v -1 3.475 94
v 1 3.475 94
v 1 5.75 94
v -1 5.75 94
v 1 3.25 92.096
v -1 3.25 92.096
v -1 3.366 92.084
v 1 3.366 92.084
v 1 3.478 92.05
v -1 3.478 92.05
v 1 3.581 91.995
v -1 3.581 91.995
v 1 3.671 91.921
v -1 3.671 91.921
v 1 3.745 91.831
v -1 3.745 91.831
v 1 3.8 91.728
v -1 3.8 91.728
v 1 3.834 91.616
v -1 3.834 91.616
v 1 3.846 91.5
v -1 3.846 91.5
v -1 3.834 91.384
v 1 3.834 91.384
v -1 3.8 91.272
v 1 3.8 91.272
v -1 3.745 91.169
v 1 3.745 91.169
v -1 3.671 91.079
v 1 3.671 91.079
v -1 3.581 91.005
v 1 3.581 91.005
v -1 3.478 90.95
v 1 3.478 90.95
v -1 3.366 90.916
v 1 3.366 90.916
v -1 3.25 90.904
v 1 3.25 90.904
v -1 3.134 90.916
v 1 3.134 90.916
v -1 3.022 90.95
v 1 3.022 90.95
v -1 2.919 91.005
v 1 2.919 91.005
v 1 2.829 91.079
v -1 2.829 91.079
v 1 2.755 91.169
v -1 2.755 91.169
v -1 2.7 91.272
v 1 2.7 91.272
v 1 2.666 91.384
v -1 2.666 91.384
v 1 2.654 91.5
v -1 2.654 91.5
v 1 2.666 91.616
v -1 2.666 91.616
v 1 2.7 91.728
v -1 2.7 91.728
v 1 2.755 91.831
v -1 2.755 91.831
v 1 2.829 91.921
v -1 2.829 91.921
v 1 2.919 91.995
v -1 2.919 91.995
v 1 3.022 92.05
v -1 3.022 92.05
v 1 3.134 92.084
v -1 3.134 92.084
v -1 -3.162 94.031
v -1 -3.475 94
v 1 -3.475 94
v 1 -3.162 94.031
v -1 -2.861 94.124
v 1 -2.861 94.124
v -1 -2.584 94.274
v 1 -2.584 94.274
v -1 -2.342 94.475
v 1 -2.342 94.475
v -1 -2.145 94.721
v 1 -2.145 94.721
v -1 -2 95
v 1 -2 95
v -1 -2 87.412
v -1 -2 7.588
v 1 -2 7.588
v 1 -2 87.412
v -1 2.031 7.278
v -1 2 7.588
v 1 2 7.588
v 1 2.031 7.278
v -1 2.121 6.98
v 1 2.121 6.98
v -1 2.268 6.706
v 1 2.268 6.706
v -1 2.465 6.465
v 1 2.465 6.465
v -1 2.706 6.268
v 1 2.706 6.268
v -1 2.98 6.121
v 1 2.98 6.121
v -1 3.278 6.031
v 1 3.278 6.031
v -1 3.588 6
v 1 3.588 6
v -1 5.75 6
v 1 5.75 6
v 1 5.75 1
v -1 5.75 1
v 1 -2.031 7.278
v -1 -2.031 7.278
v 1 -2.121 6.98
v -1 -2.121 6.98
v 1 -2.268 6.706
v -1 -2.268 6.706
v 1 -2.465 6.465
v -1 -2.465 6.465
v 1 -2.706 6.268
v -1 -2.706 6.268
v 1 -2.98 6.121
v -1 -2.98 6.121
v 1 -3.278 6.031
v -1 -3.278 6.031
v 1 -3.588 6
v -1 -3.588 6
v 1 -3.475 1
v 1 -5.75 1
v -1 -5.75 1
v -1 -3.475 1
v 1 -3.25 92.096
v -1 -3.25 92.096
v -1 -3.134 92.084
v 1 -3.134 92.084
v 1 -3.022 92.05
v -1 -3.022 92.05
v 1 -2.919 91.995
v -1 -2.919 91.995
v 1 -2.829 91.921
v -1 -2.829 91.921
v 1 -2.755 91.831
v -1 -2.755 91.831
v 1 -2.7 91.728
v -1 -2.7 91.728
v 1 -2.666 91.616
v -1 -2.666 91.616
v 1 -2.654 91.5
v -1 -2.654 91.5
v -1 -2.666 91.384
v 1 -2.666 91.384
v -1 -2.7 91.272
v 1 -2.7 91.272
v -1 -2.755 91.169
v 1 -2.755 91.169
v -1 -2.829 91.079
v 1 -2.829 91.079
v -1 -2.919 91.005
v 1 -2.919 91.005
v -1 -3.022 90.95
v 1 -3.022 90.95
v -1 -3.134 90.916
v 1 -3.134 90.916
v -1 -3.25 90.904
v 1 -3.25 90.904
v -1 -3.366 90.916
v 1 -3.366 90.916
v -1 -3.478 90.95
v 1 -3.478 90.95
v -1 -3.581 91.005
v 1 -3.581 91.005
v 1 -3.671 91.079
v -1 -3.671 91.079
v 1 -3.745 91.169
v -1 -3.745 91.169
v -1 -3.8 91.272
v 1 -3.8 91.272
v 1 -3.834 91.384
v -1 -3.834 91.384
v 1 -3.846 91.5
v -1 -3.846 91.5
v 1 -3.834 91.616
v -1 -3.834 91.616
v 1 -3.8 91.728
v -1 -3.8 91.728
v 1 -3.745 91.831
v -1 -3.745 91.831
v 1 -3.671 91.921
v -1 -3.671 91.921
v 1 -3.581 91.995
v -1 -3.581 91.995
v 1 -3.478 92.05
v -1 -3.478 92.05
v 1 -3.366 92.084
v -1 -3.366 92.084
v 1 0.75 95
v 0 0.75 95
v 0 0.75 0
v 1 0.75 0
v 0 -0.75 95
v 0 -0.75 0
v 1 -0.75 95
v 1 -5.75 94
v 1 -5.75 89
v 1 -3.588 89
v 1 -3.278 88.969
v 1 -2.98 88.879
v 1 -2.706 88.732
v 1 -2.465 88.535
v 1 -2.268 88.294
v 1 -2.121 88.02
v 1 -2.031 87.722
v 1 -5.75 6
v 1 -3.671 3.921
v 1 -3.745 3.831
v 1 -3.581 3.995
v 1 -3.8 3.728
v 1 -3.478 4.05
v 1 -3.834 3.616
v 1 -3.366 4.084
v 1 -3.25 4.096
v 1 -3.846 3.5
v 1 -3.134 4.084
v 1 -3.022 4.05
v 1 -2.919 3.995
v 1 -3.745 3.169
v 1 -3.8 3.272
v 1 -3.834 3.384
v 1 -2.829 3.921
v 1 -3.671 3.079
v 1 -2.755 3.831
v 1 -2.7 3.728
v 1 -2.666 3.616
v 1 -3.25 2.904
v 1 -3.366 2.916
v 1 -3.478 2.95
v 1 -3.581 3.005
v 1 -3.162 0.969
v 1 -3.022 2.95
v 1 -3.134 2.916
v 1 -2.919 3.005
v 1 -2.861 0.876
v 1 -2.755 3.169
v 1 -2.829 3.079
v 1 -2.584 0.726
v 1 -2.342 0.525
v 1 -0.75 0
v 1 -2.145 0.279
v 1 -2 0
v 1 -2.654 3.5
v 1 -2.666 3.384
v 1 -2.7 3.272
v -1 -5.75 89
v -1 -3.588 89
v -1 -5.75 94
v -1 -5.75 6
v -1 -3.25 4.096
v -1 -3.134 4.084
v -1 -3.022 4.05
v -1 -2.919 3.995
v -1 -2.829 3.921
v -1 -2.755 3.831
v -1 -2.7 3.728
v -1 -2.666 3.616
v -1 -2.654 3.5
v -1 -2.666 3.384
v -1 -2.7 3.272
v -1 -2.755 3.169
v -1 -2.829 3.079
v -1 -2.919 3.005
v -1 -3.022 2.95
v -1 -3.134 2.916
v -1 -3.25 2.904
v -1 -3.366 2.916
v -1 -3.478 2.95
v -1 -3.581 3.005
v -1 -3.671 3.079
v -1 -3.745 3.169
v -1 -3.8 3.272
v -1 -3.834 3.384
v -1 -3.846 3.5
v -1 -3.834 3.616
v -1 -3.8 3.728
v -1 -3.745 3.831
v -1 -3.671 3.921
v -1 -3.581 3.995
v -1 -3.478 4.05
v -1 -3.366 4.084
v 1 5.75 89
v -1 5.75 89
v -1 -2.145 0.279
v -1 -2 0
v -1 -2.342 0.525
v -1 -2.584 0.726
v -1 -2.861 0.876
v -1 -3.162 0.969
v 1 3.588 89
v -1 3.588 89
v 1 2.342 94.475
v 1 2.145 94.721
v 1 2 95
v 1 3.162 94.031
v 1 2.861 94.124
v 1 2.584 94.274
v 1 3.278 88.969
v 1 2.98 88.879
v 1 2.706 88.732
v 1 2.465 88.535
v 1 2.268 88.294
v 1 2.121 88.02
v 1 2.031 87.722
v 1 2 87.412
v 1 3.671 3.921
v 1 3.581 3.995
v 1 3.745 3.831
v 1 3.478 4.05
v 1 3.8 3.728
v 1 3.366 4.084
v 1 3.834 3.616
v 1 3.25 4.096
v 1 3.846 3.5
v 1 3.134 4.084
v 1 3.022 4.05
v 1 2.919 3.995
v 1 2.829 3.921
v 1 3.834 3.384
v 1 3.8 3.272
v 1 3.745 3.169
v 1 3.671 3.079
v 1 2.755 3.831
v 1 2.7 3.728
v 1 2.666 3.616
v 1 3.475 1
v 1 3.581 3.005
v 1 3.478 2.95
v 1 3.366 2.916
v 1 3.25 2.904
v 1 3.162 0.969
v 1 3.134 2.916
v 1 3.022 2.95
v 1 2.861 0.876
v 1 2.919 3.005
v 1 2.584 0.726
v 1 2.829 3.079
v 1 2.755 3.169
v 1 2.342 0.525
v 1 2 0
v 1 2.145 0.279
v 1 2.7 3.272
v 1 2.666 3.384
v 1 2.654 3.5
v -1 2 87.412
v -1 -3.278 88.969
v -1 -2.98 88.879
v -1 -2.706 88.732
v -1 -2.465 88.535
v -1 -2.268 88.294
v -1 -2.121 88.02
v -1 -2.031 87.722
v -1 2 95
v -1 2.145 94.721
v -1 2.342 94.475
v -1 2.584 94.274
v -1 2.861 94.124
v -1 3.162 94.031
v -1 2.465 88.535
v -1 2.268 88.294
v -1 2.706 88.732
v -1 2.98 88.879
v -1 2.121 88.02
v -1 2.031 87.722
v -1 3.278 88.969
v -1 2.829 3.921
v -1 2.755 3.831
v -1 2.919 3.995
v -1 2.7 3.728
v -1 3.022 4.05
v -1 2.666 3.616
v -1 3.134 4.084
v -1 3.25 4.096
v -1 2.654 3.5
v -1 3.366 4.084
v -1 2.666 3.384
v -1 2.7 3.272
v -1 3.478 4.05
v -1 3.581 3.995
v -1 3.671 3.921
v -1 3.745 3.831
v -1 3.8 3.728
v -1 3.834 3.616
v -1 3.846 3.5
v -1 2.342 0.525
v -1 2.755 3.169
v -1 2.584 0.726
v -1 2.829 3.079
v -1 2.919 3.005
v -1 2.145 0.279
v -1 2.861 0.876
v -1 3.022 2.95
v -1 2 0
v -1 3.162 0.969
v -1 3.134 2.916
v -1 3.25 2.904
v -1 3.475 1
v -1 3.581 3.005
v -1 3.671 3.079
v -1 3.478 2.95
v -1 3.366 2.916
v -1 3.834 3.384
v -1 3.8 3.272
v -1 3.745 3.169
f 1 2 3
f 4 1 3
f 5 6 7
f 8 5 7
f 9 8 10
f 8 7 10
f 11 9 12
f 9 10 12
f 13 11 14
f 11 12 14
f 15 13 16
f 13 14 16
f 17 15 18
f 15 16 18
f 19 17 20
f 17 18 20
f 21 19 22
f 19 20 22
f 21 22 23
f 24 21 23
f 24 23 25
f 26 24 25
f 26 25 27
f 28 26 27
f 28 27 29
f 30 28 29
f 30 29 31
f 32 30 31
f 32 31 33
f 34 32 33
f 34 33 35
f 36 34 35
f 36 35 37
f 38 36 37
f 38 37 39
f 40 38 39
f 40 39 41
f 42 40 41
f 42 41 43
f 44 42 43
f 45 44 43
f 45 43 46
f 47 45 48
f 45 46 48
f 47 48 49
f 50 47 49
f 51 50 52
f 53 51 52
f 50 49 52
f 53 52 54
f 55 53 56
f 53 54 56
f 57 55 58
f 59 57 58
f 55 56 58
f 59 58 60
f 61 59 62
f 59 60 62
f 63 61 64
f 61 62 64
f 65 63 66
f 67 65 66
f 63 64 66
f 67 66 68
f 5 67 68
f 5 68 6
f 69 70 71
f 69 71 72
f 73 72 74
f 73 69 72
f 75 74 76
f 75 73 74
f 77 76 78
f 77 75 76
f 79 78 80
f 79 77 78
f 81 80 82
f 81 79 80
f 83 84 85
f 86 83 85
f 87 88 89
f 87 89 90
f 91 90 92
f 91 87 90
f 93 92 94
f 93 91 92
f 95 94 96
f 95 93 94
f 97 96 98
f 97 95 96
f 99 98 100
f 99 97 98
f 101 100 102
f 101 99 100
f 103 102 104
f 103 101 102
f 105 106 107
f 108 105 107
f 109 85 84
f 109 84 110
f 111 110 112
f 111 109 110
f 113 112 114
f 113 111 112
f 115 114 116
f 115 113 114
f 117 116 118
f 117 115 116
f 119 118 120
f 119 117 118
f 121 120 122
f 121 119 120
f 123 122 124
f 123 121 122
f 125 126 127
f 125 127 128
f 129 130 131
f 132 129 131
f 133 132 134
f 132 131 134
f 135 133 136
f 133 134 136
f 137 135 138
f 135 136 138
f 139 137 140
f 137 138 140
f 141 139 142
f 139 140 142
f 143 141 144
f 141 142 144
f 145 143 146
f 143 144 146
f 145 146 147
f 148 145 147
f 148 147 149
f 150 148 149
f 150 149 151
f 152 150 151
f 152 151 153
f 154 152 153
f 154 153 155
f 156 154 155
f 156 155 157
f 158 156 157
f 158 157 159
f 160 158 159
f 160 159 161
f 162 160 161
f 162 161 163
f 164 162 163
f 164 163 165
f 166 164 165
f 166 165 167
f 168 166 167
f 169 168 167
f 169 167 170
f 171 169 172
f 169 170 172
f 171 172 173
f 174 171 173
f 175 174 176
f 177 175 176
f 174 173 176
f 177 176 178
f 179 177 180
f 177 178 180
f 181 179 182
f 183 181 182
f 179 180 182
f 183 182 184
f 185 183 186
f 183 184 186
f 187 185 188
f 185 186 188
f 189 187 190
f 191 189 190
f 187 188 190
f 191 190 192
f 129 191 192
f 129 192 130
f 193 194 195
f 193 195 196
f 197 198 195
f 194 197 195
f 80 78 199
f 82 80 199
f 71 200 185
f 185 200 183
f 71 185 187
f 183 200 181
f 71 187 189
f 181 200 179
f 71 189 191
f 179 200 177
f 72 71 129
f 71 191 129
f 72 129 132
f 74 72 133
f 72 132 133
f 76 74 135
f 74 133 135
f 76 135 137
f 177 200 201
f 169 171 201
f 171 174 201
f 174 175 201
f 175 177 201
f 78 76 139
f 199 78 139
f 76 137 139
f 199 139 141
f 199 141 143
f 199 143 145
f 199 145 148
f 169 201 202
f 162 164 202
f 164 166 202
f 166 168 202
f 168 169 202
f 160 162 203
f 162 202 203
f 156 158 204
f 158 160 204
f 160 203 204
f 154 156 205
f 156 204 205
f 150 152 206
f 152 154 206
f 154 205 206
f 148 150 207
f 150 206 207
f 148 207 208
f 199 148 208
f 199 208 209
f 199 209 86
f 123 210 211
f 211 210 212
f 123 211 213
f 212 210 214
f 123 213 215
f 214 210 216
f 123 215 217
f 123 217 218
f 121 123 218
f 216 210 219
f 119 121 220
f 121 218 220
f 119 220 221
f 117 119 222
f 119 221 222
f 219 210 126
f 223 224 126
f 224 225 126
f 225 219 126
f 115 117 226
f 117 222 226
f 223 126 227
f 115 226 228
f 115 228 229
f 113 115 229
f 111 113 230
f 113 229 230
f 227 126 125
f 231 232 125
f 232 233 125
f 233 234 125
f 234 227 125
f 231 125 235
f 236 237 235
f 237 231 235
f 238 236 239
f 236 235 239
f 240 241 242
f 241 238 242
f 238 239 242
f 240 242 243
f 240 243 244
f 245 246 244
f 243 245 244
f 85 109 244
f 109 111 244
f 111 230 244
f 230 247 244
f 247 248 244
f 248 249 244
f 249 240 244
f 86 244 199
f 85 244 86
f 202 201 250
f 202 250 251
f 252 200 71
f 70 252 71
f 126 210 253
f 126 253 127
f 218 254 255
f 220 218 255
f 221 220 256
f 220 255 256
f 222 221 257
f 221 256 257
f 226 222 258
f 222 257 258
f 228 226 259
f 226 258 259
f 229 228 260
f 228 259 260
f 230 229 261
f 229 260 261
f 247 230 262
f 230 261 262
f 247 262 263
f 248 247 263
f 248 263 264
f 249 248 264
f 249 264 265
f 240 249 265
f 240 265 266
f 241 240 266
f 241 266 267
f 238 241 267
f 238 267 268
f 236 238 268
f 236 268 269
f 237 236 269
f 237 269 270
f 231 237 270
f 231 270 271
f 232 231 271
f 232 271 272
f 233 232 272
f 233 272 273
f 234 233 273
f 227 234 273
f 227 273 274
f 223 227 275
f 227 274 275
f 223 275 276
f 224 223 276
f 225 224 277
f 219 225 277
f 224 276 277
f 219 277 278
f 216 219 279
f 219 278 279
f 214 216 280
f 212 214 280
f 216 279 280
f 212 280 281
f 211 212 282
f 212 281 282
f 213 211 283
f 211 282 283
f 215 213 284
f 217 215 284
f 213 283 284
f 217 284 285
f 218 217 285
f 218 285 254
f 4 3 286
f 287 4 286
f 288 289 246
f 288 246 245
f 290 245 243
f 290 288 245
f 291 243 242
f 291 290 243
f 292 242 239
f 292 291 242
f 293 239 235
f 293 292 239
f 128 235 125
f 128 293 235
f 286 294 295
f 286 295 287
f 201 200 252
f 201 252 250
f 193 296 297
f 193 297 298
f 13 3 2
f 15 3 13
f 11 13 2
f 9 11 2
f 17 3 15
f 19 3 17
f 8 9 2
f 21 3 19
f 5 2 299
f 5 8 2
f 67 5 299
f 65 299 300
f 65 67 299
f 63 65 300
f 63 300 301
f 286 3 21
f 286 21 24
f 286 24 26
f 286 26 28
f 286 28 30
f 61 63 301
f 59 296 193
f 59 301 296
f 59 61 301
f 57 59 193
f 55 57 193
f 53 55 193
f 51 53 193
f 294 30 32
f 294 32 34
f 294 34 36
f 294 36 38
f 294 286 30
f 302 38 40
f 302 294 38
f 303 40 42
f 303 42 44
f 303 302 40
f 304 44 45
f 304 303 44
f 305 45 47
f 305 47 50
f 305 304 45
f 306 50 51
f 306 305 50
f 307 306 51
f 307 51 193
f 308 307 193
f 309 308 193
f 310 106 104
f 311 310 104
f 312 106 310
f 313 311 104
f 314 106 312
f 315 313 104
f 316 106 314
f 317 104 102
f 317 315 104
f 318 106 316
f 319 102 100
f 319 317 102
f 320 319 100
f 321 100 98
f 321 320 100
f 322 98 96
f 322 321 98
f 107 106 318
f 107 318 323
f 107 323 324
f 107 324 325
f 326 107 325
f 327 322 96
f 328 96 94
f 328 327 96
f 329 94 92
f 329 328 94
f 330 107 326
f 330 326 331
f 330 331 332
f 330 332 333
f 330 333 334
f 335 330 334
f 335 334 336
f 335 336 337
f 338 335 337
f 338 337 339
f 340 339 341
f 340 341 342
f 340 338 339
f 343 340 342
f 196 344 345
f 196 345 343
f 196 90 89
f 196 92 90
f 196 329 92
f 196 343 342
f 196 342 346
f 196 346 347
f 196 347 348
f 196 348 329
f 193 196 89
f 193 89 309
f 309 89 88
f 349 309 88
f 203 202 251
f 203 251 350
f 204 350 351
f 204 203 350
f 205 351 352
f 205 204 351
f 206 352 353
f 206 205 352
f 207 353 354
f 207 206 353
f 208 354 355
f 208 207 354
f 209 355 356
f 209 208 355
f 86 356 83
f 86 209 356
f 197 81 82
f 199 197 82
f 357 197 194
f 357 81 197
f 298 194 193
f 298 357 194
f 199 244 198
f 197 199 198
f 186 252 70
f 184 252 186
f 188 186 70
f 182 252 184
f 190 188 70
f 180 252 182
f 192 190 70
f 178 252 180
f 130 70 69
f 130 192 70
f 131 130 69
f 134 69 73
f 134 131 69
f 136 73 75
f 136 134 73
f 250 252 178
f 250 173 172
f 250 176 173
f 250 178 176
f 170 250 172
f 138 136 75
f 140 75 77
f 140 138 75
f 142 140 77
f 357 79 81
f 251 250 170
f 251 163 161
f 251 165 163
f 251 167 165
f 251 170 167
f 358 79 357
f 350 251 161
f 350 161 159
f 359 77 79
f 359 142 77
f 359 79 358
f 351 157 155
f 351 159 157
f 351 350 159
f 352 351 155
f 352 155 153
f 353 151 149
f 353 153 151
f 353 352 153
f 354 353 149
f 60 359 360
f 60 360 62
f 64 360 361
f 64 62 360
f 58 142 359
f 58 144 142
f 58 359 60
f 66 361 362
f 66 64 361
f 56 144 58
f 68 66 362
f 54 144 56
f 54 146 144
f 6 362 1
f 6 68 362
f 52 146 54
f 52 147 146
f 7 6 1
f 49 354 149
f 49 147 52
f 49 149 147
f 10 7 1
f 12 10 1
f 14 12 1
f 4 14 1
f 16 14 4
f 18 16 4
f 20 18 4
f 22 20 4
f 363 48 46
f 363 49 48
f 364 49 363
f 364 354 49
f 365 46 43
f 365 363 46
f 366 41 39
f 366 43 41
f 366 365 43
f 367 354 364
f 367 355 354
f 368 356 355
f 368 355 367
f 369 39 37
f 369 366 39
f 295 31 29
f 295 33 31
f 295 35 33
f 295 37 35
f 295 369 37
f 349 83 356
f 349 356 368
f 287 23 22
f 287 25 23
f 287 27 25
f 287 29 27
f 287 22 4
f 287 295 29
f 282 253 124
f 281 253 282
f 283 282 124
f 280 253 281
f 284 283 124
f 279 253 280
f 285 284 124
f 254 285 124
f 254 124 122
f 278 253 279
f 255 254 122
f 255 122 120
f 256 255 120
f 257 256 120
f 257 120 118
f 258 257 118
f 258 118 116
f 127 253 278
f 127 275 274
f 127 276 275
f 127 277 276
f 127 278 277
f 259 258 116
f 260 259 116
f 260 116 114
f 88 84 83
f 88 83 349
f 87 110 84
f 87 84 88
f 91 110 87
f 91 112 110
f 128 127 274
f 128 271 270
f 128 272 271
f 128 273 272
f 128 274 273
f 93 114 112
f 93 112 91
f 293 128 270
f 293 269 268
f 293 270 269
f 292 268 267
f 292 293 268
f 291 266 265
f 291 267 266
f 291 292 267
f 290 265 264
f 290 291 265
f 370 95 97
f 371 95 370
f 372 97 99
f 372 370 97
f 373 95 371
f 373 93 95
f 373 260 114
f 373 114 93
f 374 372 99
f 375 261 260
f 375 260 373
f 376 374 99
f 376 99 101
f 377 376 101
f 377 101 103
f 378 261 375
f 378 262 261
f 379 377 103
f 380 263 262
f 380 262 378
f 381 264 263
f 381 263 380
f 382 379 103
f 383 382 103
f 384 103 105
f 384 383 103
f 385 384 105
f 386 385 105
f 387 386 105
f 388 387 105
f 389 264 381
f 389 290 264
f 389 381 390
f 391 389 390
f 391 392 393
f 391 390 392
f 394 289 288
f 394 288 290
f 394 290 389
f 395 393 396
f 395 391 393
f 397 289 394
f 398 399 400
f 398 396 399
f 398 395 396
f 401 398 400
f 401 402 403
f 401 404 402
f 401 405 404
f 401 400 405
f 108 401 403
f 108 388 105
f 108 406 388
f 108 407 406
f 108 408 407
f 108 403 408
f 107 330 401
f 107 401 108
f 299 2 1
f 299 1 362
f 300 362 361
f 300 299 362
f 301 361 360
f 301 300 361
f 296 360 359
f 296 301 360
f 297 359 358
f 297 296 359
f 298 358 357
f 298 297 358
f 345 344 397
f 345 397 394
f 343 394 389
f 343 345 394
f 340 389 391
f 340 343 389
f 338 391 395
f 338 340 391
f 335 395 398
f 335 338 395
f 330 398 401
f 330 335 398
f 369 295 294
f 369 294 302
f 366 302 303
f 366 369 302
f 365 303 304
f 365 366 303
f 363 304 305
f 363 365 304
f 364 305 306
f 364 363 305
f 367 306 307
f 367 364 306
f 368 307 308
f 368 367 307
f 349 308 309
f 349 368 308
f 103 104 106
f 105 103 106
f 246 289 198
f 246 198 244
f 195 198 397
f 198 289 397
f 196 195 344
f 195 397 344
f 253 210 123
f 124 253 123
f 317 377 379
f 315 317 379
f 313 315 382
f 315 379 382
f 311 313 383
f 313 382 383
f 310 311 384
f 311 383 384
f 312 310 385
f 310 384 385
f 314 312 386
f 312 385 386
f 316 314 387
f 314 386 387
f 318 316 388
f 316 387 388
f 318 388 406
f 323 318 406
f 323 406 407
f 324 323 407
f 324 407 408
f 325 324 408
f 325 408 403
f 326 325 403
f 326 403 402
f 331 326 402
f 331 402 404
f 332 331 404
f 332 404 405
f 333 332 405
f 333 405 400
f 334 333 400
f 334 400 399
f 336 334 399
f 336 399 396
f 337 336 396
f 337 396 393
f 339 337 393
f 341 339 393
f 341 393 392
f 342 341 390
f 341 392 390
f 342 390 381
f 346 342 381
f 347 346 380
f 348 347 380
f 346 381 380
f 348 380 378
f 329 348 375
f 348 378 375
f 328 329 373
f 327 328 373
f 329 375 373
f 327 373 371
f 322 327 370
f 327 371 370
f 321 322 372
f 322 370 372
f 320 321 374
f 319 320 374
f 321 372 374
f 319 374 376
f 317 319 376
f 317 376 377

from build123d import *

# Parameters (mm, degrees)
BOSS_EXTRUDE1_DEPTH       = 95
SKETCH4_W                 = 5
SKETCH4_H                 = 5
BOSS_EXTRUDE4_DEPTH       = 2
FILLET1_R                 = 1.5875
F_0_80_TAPPED_HOLE1_D     = 1.19126
F_0_80_TAPPED_HOLE1_DEPTH = 4.0005
F_0_80_TAPPED_HOLE1_TIP   = 0.357890611


with BuildPart() as part:
    # Sketch1 → Boss-Extrude1 (new body)
    with BuildSketch(Plane.XY):
        Polygon((-1, 2), (-1, -2), (1, -2), (1, -0.75), (0, -0.75), (0, 0.75), (1, 0.75), (1, 2), align=None)
    extrude(amount=BOSS_EXTRUDE1_DEPTH)

    # Sketch4 → Boss-Extrude4 (add)
    with BuildSketch(Plane(origin=(1, 0, 0), x_dir=(0, 0, -1), z_dir=(1, 0, 0))):
        with Locations((-91.5, 3.25)):
            Rectangle(SKETCH4_W, SKETCH4_H)
        with Locations((-91.5, -3.25)):
            Rectangle(SKETCH4_W, SKETCH4_H)
        with Locations((-3.5, 3.25)):
            Rectangle(SKETCH4_W, SKETCH4_H)
        with Locations((-3.5, -3.25)):
            Rectangle(SKETCH4_W, SKETCH4_H)
    extrude(amount=-BOSS_EXTRUDE4_DEPTH)

    # Fillet1
    # the kernel refuses this fillet: 1.5875 mm, written as the material it adds along each edge
    with BuildSketch(Plane(origin=(1, 2, 94), x_dir=(0, 0, 1), z_dir=(-1, 0, 0))) as fillet1_piece_1:
        with BuildLine():
            CenterArc((1.5875, 1.47478812), FILLET1_R, 180, 68.279526527)
            Line((0, 1.47478812), (-0.03175, 1.47478812))
            Line((-0.03175, 1.47478812), (-0.03175, 0))
            Line((-0.03175, 0), (0, -0.03175))
            ThreePointArc((0, -0.03175), (0.5, -0.03175), (0.98825, -0.029495762))
            Line((0.98825, -0.029495762), (1, 0))
        make_face()
    extrude(amount=2)
    with BuildSketch(Plane(origin=(-1, 2, 89), x_dir=(0, 1, 0), z_dir=(1, 0, 0)), Plane(origin=(-1, 2, 6), x_dir=(0, 0, 1), z_dir=(1, 0, 0))) as fillet1_piece_2:
        with BuildLine():
            CenterArc((FILLET1_R, -FILLET1_R), FILLET1_R, 90, 90)
            Line((0, -FILLET1_R), (-FILLET1_R * 0.02, -FILLET1_R))
            Line((-FILLET1_R * 0.02, -FILLET1_R), (-FILLET1_R * 0.02, FILLET1_R * 0.02))
            Line((-FILLET1_R * 0.02, FILLET1_R * 0.02), (FILLET1_R, FILLET1_R * 0.02))
            Line((FILLET1_R, FILLET1_R * 0.02), (FILLET1_R, 0))
        make_face()
    extrude(amount=2)
    with BuildSketch(Plane(origin=(1, 2, 1), x_dir=(0, 1, 0), z_dir=(-1, 0, 0))) as fillet1_piece_3:
        with BuildLine():
            CenterArc((1.47478812, 1.5875), FILLET1_R, 201.720473473, 68.279526527)
            Line((0, 1), (-0.029495762, 0.98825))
            ThreePointArc((-0.029495762, 0.98825), (-0.03175, 0.5), (-0.03175, 0))
            Line((-0.03175, 0), (0, -0.03175))
            Line((0, -0.03175), (1.47478812, -0.03175))
            Line((1.47478812, -0.03175), (1.47478812, 0))
        make_face()
    extrude(amount=2)
    with BuildSketch(Plane(origin=(1, -2, 6), x_dir=(0, -1, 0), z_dir=(-1, 0, 0)), Plane(origin=(1, -2, 89), x_dir=(0, 0, -1), z_dir=(-1, 0, 0))) as fillet1_piece_4:
        with BuildLine():
            CenterArc((FILLET1_R, FILLET1_R), FILLET1_R, 180, 90)
            Line((0, FILLET1_R), (-FILLET1_R * 0.02, FILLET1_R))
            Line((-FILLET1_R * 0.02, FILLET1_R), (-FILLET1_R * 0.02, -FILLET1_R * 0.02))
            Line((-FILLET1_R * 0.02, -FILLET1_R * 0.02), (FILLET1_R, -FILLET1_R * 0.02))
            Line((FILLET1_R, -FILLET1_R * 0.02), (FILLET1_R, 0))
        make_face()
    extrude(amount=2)
    with BuildSketch(Plane(origin=(-1, -2, 1), x_dir=(0, 0, -1), z_dir=(1, 0, 0))) as fillet1_piece_5:
        with BuildLine():
            CenterArc((1.5875, -1.47478812), FILLET1_R, 111.720473473, 68.279526527)
            Line((0, -1.47478812), (-0.03175, -1.47478812))
            Line((-0.03175, -1.47478812), (-0.03175, 0))
            Line((-0.03175, 0), (0, 0.03175))
            ThreePointArc((0, 0.03175), (0.5, 0.03175), (0.98825, 0.029495762))
            Line((0.98825, 0.029495762), (1, 0))
        make_face()
    extrude(amount=2)
    with BuildSketch(Plane(origin=(-1, -2, 94), x_dir=(0, -1, 0), z_dir=(1, 0, 0))) as fillet1_piece_6:
        with BuildLine():
            CenterArc((1.47478812, -1.5875), FILLET1_R, 90, 68.279526527)
            Line((0, -1), (-0.029495762, -0.98825))
            ThreePointArc((-0.029495762, -0.98825), (-0.03175, -0.5), (-0.03175, 0))
            Line((-0.03175, 0), (0, 0.03175))
            Line((0, 0.03175), (1.47478812, 0.03175))
            Line((1.47478812, 0.03175), (1.47478812, 0))
        make_face()
    extrude(amount=2)

    # #0-80 Tapped Hole1
    with Locations(Plane(origin=(1, 0, 0), x_dir=(0, 0, -1), z_dir=(1, 0, 0))):
        with Locations((-91.5, 3.25), (-3.5, -3.25), (-91.5, -3.25), (-3.5, 3.25)):
            Hole(F_0_80_TAPPED_HOLE1_D / 2, depth=F_0_80_TAPPED_HOLE1_DEPTH)
            with Locations((0, 0, -(F_0_80_TAPPED_HOLE1_DEPTH + F_0_80_TAPPED_HOLE1_TIP / 2))):  # 118° drill point
                Cone(0, F_0_80_TAPPED_HOLE1_D / 2, F_0_80_TAPPED_HOLE1_TIP, mode=Mode.SUBTRACT)


solid = part.part
